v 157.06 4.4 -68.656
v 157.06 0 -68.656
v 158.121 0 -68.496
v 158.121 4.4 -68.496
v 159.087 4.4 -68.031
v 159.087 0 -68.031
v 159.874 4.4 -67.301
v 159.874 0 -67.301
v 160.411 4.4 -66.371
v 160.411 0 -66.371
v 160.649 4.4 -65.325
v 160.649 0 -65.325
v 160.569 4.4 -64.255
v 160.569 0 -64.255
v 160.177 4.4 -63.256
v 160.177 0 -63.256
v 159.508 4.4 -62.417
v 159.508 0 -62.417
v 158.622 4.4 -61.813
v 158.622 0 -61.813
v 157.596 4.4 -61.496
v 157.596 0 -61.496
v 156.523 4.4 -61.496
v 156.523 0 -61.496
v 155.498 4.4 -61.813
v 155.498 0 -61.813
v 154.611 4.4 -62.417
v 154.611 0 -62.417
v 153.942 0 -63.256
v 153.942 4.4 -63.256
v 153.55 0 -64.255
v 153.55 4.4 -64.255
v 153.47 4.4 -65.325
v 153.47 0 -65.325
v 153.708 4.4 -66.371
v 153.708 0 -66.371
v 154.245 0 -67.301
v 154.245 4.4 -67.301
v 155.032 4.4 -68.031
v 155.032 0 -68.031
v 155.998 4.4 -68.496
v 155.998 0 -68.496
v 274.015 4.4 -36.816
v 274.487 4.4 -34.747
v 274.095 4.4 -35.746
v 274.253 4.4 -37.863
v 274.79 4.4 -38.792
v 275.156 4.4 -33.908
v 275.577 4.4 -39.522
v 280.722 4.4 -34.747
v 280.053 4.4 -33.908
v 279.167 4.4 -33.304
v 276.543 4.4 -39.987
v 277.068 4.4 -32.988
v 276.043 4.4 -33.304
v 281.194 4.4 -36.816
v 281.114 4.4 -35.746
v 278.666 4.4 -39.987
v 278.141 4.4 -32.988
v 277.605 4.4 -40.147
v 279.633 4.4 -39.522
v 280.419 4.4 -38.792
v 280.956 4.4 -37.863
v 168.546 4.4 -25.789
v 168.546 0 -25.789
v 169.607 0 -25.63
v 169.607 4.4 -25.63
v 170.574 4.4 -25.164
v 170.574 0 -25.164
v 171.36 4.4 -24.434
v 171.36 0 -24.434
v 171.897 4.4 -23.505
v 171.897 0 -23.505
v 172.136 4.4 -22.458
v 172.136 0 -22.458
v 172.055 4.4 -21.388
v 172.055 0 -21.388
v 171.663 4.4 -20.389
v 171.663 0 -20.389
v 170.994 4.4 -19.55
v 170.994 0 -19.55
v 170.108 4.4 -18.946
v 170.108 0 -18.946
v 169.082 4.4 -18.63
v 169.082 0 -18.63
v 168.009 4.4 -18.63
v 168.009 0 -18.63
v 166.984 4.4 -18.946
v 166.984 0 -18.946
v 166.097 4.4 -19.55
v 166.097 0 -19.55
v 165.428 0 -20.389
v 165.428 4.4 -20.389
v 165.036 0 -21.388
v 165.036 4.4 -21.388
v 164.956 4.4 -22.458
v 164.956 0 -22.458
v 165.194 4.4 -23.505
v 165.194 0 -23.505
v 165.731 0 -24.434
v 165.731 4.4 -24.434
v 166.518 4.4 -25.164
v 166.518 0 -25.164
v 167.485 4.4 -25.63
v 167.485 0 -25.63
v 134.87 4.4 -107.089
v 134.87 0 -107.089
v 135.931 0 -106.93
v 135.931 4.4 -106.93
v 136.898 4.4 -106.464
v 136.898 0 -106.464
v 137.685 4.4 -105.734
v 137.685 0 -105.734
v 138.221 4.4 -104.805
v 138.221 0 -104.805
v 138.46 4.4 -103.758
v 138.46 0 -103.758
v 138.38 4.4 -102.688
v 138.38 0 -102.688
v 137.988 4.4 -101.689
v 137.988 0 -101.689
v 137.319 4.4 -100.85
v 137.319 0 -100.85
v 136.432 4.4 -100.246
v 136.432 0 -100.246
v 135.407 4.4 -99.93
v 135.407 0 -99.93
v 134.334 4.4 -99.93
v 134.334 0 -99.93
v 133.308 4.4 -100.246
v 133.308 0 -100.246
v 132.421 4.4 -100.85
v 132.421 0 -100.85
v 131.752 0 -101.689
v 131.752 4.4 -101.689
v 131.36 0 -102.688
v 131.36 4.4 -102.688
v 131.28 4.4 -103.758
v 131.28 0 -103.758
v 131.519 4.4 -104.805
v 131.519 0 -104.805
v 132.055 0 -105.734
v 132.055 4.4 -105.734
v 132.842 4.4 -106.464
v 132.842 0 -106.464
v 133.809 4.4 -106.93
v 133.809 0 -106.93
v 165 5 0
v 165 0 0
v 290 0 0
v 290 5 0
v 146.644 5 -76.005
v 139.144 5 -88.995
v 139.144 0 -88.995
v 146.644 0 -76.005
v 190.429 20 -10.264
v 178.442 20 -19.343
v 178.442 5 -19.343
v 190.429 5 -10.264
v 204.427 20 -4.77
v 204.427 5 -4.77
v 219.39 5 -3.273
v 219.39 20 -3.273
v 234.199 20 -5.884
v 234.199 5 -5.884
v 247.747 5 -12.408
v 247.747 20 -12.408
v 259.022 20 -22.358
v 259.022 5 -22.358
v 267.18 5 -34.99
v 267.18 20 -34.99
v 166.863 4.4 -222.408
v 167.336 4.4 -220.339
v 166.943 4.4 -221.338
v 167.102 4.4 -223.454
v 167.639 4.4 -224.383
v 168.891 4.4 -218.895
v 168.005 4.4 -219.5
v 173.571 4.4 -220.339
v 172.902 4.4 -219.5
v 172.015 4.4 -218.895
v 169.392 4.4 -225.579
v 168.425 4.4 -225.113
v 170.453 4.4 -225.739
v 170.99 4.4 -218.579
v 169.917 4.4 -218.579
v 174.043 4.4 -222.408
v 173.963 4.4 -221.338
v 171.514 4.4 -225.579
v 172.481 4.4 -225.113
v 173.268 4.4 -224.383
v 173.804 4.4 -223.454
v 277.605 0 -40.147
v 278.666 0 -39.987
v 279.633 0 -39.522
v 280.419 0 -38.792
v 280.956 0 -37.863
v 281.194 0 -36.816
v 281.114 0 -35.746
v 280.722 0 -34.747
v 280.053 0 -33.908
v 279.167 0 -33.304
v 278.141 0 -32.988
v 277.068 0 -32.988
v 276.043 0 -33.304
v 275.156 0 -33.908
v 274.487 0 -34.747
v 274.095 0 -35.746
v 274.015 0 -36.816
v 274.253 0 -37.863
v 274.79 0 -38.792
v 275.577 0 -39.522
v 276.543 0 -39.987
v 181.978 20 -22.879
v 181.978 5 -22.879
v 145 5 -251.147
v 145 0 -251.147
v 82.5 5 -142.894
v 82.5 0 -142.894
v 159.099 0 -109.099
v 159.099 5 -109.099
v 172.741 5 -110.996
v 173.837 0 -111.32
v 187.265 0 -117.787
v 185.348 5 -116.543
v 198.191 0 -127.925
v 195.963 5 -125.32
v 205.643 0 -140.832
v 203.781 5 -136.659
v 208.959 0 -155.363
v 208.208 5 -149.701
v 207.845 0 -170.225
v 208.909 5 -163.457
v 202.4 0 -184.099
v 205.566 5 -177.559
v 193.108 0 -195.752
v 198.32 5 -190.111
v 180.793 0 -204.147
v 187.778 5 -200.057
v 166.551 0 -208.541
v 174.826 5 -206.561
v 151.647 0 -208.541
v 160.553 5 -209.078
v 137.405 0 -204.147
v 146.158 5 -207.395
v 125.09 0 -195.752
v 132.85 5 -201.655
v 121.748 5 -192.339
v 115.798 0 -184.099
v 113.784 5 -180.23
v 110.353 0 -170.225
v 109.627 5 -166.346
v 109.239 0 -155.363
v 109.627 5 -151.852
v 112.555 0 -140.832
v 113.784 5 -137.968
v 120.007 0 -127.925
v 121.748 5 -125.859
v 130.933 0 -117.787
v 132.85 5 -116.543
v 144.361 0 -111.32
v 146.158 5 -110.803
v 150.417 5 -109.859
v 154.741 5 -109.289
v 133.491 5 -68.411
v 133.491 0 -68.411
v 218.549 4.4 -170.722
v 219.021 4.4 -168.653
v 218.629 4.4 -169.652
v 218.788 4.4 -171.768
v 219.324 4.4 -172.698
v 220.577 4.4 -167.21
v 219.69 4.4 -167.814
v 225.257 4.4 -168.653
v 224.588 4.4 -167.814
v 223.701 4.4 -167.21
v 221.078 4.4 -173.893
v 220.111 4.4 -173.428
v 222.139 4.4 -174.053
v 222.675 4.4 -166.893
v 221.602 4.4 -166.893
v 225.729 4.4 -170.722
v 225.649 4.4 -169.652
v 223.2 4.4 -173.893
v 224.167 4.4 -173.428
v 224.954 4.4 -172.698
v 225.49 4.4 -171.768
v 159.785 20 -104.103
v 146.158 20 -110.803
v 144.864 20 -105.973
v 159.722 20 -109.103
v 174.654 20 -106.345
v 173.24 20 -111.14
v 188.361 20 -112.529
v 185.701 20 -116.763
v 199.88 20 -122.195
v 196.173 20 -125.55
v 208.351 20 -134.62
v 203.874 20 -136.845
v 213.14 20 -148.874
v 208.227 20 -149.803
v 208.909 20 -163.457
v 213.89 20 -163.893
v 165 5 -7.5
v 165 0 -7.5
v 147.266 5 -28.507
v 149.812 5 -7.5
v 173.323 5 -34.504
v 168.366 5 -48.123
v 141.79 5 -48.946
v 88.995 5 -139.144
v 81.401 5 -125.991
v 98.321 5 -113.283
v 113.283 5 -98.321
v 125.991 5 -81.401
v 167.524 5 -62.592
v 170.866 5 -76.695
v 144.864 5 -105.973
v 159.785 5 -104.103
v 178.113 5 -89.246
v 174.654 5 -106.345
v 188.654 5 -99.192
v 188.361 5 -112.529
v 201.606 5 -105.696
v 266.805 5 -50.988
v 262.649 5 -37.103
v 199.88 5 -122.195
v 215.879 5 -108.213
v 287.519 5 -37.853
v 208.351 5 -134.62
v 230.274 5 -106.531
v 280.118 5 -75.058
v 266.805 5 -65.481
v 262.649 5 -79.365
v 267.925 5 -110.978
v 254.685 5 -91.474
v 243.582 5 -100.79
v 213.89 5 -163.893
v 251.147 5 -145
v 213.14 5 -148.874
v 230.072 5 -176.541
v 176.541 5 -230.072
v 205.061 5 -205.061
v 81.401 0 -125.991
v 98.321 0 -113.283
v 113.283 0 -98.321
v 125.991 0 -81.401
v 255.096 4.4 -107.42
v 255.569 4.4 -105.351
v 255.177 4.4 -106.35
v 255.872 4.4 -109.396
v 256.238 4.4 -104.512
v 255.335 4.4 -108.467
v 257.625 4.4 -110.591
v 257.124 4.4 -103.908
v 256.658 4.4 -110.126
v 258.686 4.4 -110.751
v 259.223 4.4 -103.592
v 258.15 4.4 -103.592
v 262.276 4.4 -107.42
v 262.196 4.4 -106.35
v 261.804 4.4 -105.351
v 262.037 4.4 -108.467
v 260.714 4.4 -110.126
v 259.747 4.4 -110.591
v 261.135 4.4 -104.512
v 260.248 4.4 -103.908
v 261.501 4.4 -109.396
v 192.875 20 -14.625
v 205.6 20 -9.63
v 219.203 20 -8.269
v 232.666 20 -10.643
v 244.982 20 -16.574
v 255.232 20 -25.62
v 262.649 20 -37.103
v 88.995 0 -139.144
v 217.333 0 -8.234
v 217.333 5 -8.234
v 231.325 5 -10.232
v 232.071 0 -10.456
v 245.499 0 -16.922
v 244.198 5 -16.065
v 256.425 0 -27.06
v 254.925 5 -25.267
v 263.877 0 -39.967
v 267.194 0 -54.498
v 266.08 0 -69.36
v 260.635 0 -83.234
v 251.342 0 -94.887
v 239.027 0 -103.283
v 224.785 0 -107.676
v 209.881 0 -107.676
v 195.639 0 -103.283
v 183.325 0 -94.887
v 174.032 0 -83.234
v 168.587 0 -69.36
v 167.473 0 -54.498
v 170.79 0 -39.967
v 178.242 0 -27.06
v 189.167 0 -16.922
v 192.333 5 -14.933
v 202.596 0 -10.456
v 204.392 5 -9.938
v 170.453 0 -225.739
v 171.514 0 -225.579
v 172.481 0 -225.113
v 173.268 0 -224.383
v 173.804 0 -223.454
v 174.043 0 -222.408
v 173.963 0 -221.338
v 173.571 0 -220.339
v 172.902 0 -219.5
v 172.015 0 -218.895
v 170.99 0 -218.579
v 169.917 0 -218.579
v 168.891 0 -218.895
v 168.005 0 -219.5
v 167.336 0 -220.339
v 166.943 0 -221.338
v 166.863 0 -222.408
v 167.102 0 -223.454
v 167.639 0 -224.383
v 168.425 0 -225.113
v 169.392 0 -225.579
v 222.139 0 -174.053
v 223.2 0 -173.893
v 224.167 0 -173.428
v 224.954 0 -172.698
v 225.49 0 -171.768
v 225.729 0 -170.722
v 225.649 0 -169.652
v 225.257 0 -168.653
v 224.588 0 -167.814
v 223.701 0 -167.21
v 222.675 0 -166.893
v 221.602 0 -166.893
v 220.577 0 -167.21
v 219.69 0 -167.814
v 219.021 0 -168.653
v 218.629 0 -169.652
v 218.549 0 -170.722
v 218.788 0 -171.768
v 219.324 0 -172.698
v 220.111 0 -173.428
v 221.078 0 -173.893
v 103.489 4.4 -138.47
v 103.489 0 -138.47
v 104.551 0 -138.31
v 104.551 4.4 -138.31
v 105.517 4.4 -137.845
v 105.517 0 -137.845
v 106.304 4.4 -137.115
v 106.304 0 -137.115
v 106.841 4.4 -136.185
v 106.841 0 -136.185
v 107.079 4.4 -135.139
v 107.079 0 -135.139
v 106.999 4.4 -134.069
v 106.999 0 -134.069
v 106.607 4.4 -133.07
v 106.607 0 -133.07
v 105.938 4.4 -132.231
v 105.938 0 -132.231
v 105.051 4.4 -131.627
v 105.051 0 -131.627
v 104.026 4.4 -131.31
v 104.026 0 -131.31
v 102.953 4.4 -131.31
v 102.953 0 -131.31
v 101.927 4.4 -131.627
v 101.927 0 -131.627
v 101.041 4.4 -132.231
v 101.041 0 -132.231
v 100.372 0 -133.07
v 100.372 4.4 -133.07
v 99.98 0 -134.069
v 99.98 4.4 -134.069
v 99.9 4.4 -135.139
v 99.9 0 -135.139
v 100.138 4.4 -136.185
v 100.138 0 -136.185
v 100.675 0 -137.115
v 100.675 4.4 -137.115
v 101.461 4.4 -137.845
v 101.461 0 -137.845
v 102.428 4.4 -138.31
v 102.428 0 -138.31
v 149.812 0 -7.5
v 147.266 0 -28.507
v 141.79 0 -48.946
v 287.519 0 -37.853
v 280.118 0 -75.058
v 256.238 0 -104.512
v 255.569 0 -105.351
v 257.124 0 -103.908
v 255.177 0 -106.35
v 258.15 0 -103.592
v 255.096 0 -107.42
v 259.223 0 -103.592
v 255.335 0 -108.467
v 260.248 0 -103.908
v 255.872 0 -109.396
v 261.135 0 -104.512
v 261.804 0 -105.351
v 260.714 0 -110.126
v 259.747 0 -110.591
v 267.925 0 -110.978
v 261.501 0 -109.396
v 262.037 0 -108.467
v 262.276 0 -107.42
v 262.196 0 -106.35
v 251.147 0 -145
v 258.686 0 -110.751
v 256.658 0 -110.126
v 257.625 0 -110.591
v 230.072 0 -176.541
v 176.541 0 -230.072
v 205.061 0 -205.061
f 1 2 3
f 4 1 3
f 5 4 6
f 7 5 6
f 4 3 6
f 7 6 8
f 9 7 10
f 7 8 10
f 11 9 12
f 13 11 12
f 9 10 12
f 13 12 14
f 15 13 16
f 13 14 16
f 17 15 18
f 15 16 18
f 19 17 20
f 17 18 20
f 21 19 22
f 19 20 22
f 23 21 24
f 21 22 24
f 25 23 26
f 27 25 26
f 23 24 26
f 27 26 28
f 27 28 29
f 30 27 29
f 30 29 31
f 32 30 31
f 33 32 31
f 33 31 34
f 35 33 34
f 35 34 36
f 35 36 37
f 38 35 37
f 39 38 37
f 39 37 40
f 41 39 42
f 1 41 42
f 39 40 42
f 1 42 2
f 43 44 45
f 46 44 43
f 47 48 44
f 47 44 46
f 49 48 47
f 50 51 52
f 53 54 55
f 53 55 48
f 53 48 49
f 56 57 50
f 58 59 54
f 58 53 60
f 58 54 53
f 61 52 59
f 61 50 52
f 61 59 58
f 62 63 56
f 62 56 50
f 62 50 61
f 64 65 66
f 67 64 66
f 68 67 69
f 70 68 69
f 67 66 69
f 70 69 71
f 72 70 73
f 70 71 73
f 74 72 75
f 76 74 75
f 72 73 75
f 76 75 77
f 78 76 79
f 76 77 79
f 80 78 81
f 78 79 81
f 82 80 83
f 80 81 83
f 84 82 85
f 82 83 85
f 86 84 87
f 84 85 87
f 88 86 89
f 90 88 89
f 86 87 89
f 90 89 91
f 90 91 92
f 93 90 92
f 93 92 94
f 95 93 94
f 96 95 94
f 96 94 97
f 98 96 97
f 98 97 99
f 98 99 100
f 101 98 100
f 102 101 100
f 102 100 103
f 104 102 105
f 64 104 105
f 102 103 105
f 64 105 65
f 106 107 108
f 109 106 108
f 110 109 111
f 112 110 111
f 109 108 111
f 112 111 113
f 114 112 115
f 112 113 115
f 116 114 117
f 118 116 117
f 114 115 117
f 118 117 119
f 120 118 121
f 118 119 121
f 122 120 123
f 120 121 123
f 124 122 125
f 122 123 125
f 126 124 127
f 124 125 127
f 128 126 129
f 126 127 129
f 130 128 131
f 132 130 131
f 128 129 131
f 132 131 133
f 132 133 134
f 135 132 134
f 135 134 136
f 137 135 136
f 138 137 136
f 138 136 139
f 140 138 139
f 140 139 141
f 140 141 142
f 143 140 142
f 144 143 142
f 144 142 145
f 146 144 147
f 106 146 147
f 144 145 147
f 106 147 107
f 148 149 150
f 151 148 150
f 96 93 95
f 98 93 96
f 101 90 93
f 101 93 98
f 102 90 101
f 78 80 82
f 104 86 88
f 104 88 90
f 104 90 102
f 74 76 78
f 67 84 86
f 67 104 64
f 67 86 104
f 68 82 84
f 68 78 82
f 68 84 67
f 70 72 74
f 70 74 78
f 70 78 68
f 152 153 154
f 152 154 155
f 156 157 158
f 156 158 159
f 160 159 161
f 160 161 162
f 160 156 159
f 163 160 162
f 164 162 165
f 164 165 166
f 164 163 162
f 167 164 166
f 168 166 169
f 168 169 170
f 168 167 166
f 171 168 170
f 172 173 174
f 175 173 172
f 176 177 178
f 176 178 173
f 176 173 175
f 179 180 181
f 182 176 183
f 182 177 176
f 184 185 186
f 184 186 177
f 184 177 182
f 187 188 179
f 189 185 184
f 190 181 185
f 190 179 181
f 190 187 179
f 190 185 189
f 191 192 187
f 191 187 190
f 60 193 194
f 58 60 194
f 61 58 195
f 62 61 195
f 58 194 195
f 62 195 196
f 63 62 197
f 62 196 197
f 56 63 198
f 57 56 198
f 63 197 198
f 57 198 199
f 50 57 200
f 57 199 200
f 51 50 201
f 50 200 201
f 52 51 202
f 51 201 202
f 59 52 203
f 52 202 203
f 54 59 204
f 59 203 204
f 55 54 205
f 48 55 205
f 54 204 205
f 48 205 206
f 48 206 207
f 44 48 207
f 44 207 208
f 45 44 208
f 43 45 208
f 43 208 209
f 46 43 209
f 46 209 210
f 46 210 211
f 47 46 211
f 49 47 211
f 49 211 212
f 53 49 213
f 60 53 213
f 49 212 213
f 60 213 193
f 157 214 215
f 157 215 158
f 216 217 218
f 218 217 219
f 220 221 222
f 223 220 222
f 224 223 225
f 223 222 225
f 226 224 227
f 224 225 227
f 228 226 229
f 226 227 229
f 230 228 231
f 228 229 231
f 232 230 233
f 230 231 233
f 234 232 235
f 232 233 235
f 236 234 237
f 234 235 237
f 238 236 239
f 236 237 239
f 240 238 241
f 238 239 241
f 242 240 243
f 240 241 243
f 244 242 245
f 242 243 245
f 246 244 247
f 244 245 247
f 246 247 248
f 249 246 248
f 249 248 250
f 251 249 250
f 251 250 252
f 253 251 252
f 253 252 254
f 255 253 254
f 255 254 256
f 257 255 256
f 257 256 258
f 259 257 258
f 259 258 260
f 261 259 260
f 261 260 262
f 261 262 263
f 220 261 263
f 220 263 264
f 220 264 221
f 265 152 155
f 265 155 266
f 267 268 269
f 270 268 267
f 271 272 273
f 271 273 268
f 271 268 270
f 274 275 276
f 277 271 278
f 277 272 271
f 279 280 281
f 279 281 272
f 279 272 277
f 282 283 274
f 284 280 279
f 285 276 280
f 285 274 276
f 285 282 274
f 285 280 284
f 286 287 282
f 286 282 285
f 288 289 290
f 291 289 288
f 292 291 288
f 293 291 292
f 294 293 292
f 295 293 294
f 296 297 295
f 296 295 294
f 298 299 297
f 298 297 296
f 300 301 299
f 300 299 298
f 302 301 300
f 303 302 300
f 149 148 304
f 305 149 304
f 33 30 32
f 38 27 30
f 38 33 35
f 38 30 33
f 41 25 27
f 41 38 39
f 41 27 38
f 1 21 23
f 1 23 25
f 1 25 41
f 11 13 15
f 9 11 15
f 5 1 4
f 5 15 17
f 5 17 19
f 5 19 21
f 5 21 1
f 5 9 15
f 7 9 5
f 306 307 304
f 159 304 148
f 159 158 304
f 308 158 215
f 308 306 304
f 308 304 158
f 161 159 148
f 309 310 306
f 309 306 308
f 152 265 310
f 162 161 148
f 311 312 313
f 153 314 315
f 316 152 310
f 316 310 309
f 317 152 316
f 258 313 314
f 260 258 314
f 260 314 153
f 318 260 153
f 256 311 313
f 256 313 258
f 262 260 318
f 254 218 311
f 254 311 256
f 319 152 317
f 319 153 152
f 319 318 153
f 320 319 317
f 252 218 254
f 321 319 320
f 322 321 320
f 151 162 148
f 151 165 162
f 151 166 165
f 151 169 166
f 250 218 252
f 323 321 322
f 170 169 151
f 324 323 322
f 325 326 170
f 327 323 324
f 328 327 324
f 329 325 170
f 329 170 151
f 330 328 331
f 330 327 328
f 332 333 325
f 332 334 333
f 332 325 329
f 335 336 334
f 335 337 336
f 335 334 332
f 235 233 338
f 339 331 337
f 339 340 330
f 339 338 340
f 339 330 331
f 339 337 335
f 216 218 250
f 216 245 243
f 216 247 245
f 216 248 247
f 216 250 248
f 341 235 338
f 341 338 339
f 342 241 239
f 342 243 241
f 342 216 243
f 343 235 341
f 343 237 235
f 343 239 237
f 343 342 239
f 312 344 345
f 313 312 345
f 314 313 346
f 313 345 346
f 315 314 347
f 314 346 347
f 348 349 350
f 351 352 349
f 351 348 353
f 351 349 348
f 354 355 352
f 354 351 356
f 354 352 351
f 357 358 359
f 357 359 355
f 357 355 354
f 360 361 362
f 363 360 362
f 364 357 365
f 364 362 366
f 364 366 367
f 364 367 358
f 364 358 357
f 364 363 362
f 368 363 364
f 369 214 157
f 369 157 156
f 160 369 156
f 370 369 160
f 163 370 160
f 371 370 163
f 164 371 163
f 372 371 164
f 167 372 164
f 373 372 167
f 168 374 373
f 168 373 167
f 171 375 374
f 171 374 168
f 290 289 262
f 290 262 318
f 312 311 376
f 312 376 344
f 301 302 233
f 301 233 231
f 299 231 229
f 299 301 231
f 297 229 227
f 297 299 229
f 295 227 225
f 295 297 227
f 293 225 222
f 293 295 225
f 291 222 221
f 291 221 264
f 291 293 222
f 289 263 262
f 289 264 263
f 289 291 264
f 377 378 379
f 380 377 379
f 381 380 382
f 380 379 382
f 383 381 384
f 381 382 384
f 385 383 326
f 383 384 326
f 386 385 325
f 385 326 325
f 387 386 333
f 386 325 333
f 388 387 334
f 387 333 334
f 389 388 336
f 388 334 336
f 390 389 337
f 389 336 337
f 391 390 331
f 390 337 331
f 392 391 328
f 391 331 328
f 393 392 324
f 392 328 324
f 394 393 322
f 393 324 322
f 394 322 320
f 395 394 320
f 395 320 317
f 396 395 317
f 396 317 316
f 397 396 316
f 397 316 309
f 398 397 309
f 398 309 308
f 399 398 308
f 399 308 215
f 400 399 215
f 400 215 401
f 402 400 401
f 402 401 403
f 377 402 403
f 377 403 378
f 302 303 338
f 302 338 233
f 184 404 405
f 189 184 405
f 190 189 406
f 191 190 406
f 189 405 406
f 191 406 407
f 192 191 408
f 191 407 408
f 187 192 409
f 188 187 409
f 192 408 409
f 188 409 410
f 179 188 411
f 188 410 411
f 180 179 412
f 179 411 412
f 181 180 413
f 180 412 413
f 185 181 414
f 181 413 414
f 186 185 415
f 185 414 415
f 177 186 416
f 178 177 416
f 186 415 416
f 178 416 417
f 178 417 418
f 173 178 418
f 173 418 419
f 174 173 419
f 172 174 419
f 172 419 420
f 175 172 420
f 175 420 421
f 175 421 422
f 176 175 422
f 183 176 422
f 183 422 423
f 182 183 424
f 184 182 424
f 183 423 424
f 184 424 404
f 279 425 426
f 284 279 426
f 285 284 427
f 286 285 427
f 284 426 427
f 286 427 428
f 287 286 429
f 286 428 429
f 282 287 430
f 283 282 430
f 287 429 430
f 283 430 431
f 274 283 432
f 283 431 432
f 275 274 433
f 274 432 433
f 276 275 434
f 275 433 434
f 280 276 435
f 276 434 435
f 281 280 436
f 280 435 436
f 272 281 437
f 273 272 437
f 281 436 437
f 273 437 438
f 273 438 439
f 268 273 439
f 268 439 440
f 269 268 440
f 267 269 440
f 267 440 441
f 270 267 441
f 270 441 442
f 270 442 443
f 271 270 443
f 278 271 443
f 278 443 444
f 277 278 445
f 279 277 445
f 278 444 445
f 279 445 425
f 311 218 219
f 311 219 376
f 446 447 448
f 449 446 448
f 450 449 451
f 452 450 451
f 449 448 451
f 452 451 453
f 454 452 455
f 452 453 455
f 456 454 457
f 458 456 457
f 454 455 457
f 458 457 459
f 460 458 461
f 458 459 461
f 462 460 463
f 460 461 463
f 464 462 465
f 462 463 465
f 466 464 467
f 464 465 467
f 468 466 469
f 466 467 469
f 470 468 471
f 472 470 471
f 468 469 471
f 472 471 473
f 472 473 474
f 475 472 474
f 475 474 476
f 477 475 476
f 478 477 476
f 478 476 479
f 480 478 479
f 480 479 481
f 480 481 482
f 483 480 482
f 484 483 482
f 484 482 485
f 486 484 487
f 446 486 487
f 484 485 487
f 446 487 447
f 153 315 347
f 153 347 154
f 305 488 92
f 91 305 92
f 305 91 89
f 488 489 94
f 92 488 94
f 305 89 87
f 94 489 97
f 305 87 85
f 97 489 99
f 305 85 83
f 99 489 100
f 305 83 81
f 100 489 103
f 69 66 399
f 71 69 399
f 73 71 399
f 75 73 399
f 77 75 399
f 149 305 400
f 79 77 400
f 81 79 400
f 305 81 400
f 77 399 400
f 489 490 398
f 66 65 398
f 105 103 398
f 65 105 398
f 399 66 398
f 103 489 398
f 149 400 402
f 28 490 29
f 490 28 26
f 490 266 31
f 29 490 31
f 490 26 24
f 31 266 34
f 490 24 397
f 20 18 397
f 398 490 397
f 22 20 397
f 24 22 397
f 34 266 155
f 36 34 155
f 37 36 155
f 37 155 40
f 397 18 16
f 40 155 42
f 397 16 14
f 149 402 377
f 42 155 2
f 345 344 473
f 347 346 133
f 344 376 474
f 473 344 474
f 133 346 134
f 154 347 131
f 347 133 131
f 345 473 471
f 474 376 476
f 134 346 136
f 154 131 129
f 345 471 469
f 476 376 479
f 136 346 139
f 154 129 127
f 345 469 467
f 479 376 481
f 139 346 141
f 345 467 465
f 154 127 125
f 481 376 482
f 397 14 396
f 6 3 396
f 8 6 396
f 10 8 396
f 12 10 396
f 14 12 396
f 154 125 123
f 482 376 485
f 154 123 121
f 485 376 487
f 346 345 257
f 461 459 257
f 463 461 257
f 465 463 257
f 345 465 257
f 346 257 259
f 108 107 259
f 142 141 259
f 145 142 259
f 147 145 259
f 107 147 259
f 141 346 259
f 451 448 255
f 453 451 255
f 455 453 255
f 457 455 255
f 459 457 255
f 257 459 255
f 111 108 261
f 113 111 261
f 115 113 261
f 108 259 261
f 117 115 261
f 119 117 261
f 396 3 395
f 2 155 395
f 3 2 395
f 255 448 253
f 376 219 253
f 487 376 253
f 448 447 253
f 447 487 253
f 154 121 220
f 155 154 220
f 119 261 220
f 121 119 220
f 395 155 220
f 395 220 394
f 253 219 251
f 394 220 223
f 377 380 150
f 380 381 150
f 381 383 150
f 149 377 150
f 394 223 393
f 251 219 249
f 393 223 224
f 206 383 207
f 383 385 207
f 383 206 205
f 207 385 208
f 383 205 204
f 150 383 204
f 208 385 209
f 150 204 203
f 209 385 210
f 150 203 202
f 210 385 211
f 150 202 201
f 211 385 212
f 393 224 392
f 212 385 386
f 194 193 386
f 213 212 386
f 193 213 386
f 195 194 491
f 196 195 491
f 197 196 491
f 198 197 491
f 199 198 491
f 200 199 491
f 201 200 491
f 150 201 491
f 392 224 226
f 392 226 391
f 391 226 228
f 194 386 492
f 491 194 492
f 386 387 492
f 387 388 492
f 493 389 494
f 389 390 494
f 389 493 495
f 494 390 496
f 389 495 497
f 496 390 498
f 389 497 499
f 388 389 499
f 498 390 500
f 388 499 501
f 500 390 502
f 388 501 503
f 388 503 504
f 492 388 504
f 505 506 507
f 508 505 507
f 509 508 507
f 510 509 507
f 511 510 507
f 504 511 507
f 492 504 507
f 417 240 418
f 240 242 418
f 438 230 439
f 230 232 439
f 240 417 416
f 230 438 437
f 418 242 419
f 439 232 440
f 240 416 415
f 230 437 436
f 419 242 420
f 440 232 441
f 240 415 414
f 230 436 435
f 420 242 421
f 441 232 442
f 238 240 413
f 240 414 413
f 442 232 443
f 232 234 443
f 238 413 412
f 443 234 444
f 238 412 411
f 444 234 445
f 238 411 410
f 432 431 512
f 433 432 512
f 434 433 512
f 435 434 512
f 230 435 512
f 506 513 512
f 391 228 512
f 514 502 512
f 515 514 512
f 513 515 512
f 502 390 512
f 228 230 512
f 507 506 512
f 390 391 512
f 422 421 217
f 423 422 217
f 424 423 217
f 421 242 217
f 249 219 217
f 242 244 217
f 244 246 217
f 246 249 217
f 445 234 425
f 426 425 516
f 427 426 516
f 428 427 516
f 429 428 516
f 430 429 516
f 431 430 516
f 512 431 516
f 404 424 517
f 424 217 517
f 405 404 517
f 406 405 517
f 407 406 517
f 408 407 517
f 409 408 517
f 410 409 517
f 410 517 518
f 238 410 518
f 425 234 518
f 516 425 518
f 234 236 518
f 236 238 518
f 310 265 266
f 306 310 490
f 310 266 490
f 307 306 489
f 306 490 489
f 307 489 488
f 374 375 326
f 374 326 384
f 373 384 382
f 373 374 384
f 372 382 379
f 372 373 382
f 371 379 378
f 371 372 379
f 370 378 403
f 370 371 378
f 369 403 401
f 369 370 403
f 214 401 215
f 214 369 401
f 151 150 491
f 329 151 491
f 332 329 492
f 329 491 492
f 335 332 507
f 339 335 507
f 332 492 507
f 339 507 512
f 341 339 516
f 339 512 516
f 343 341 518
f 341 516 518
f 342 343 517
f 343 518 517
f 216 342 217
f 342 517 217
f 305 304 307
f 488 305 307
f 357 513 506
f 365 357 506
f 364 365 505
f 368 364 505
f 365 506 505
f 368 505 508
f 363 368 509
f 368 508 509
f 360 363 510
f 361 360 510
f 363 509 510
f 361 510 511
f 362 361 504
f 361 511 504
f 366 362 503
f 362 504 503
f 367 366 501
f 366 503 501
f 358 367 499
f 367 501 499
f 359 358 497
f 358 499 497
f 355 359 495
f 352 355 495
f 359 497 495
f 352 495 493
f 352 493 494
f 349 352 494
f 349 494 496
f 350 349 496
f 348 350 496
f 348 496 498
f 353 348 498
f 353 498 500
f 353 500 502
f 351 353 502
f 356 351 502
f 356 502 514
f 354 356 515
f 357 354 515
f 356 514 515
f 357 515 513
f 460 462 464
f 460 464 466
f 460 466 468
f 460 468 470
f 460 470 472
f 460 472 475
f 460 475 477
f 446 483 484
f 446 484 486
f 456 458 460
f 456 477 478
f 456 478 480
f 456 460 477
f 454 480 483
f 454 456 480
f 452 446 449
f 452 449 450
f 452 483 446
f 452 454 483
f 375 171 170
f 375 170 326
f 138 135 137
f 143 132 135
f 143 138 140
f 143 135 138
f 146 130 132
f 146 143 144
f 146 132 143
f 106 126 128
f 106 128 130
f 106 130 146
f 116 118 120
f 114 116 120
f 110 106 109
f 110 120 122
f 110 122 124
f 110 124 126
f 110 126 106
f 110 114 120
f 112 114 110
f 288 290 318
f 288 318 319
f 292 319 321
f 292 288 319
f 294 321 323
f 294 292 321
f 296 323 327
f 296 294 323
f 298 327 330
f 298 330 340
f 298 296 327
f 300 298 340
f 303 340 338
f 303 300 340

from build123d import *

# Parameters (mm, degrees)
AUFSATZ_LINEAR_AUSTRAGEN1_DEPTH = 5
SKIZZE2_R                       = 50
SCHNITT_LINEAR_AUSTRAGEN1_DEPTH = 384.666521865
AUFSATZ_LINEAR_START            = 15
AUFSATZ_LINEAR_AUSTRAGEN2_DEPTH = 15
SKIZZE4_R                       = 3.6
SCHNITT_LINEAR_AUSTRAGEN2_DEPTH = 4.4
SCHNITT_LINEAR_AUSTRAGEN3_DEPTH = 384.927076409


with BuildPart() as part:
    # Skizze1 → Aufsatz-Linear austragen1 (new body)
    with BuildSketch(Plane(origin=(0, 0, 0), x_dir=(1, 0, 0), z_dir=(0, 1, 0))):
        with BuildLine():
            Line((150, 0), (290, 0))
            ThreePointArc((290, 0), (251.147367097, 145), (145, 251.147367097))
            Line((145, 251.147367097), (75, 129.903810568))
            ThreePointArc((75, 129.903810568), (129.903810568, 75), (150, 0))
        make_face()
    extrude(amount=AUFSATZ_LINEAR_AUSTRAGEN1_DEPTH)

    # Skizze2 → Schnitt-Linear austragen1 (cut, through all)
    with BuildSketch(Plane(origin=(0, 5, 0), x_dir=(1, 0, 0), z_dir=(0, 1, 0))):
        with Locations(Location((217.333310915, 58.234285148, 0), (0, 0, 270))):
            Circle(SKIZZE2_R)
        with Locations(Location((159.099025767, 159.099025767, 0), (0, 0, 270))):
            Circle(SKIZZE2_R)
    extrude(amount=-SCHNITT_LINEAR_AUSTRAGEN1_DEPTH, mode=Mode.SUBTRACT)

    # Skizze3 → Aufsatz-Linear austragen2 (add)
    with BuildSketch(Plane(origin=(0, 5, 0), x_dir=(1, 0, 0), z_dir=(0, 1, 0)).offset(AUFSATZ_LINEAR_START)):
        with BuildLine():
            Line((146.158073512, 110.802734453), (144.863978286, 105.973105321))
            ThreePointArc((144.863978286, 105.973105321), (194.4523443, 116.966581395), (213.889734162, 163.892591618))
            Line((213.889734162, 163.892591618), (208.908760672, 163.456812904))
            ThreePointArc((208.908760672, 163.456812904), (191.238406251, 120.796803611), (146.158073512, 110.802734453))
        make_face()
        with BuildLine():
            Line((181.977971856, 22.878946089), (178.44243795, 19.343412183))
            ThreePointArc((178.44243795, 19.343412183), (226.883960687, 4.069858732), (267.180239202, 34.990280752))
            Line((267.180239202, 34.990280752), (262.648700267, 37.103372061))
            ThreePointArc((262.648700267, 37.103372061), (226.015719798, 8.993897497), (181.977971856, 22.878946089))
        make_face()
    extrude(amount=-AUFSATZ_LINEAR_AUSTRAGEN2_DEPTH)

    # Skizze4 → Schnitt-Linear austragen2 (cut)
    with BuildSketch(Plane.XZ):
        with Locations(Location((277.604561185, -36.547333822, 0), (0, 0, 270))):
            Circle(SKIZZE4_R)
        with Locations(Location((258.686269103, -107.151361062, 0), (0, 0, 270))):
            Circle(SKIZZE4_R)
        with Locations(Location((222.138935282, -170.453200122, 0), (0, 0, 270))):
            Circle(SKIZZE4_R)
        with Locations(Location((170.453200122, -222.138935282, 0), (0, 0, 270))):
            Circle(SKIZZE4_R)
        with Locations(Location((103.489442931, -134.87006785, 0), (0, 0, 270))):
            Circle(SKIZZE4_R)
        with Locations(Location((134.87006785, -103.489442931, 0), (0, 0, 270))):
            Circle(SKIZZE4_R)
        with Locations(Location((168.545626434, -22.189452677, 0), (0, 0, 270))):
            Circle(SKIZZE4_R)
        with Locations(Location((157.059520527, -65.056183502, 0), (0, 0, 270))):
            Circle(SKIZZE4_R)
    extrude(amount=-SCHNITT_LINEAR_AUSTRAGEN2_DEPTH, mode=Mode.SUBTRACT)

    # Skizze5 → Schnitt-Linear austragen3 (cut, through all)
    with BuildSketch(Plane(origin=(0, 5, 0), x_dir=(1, 0, 0), z_dir=(0, 1, 0))):
        with BuildLine():
            Line((75, 129.903810568), (82.5, 142.894191624))
            Line((82.5, 142.894191624), (88.995190528, 139.144191624))
            Line((88.995190528, 139.144191624), (81.401381861, 125.99132919))
            ThreePointArc((81.401381861, 125.99132919), (78.225155415, 127.987597291), (75, 129.903810568))
        make_face()
        with BuildLine():
            Line((150, 0), (165, 0))
            Line((165, 0), (165, 7.5))
            Line((165, 7.5), (149.812382666, 7.5))
            ThreePointArc((149.812382666, 7.5), (149.953088331, 3.751173159), (150, 0))
        make_face()
        with BuildLine():
            Line((125.99132919, 81.401381861), (139.144191624, 88.995190528))
            Line((139.144191624, 88.995190528), (146.644191624, 76.004809472))
            Line((146.644191624, 76.004809472), (133.49132919, 68.411000805))
            ThreePointArc((133.49132919, 68.411000805), (129.903810568, 75), (125.99132919, 81.401381861))
        make_face()
    extrude(amount=-SCHNITT_LINEAR_AUSTRAGEN3_DEPTH, mode=Mode.SUBTRACT)


solid = part.part
